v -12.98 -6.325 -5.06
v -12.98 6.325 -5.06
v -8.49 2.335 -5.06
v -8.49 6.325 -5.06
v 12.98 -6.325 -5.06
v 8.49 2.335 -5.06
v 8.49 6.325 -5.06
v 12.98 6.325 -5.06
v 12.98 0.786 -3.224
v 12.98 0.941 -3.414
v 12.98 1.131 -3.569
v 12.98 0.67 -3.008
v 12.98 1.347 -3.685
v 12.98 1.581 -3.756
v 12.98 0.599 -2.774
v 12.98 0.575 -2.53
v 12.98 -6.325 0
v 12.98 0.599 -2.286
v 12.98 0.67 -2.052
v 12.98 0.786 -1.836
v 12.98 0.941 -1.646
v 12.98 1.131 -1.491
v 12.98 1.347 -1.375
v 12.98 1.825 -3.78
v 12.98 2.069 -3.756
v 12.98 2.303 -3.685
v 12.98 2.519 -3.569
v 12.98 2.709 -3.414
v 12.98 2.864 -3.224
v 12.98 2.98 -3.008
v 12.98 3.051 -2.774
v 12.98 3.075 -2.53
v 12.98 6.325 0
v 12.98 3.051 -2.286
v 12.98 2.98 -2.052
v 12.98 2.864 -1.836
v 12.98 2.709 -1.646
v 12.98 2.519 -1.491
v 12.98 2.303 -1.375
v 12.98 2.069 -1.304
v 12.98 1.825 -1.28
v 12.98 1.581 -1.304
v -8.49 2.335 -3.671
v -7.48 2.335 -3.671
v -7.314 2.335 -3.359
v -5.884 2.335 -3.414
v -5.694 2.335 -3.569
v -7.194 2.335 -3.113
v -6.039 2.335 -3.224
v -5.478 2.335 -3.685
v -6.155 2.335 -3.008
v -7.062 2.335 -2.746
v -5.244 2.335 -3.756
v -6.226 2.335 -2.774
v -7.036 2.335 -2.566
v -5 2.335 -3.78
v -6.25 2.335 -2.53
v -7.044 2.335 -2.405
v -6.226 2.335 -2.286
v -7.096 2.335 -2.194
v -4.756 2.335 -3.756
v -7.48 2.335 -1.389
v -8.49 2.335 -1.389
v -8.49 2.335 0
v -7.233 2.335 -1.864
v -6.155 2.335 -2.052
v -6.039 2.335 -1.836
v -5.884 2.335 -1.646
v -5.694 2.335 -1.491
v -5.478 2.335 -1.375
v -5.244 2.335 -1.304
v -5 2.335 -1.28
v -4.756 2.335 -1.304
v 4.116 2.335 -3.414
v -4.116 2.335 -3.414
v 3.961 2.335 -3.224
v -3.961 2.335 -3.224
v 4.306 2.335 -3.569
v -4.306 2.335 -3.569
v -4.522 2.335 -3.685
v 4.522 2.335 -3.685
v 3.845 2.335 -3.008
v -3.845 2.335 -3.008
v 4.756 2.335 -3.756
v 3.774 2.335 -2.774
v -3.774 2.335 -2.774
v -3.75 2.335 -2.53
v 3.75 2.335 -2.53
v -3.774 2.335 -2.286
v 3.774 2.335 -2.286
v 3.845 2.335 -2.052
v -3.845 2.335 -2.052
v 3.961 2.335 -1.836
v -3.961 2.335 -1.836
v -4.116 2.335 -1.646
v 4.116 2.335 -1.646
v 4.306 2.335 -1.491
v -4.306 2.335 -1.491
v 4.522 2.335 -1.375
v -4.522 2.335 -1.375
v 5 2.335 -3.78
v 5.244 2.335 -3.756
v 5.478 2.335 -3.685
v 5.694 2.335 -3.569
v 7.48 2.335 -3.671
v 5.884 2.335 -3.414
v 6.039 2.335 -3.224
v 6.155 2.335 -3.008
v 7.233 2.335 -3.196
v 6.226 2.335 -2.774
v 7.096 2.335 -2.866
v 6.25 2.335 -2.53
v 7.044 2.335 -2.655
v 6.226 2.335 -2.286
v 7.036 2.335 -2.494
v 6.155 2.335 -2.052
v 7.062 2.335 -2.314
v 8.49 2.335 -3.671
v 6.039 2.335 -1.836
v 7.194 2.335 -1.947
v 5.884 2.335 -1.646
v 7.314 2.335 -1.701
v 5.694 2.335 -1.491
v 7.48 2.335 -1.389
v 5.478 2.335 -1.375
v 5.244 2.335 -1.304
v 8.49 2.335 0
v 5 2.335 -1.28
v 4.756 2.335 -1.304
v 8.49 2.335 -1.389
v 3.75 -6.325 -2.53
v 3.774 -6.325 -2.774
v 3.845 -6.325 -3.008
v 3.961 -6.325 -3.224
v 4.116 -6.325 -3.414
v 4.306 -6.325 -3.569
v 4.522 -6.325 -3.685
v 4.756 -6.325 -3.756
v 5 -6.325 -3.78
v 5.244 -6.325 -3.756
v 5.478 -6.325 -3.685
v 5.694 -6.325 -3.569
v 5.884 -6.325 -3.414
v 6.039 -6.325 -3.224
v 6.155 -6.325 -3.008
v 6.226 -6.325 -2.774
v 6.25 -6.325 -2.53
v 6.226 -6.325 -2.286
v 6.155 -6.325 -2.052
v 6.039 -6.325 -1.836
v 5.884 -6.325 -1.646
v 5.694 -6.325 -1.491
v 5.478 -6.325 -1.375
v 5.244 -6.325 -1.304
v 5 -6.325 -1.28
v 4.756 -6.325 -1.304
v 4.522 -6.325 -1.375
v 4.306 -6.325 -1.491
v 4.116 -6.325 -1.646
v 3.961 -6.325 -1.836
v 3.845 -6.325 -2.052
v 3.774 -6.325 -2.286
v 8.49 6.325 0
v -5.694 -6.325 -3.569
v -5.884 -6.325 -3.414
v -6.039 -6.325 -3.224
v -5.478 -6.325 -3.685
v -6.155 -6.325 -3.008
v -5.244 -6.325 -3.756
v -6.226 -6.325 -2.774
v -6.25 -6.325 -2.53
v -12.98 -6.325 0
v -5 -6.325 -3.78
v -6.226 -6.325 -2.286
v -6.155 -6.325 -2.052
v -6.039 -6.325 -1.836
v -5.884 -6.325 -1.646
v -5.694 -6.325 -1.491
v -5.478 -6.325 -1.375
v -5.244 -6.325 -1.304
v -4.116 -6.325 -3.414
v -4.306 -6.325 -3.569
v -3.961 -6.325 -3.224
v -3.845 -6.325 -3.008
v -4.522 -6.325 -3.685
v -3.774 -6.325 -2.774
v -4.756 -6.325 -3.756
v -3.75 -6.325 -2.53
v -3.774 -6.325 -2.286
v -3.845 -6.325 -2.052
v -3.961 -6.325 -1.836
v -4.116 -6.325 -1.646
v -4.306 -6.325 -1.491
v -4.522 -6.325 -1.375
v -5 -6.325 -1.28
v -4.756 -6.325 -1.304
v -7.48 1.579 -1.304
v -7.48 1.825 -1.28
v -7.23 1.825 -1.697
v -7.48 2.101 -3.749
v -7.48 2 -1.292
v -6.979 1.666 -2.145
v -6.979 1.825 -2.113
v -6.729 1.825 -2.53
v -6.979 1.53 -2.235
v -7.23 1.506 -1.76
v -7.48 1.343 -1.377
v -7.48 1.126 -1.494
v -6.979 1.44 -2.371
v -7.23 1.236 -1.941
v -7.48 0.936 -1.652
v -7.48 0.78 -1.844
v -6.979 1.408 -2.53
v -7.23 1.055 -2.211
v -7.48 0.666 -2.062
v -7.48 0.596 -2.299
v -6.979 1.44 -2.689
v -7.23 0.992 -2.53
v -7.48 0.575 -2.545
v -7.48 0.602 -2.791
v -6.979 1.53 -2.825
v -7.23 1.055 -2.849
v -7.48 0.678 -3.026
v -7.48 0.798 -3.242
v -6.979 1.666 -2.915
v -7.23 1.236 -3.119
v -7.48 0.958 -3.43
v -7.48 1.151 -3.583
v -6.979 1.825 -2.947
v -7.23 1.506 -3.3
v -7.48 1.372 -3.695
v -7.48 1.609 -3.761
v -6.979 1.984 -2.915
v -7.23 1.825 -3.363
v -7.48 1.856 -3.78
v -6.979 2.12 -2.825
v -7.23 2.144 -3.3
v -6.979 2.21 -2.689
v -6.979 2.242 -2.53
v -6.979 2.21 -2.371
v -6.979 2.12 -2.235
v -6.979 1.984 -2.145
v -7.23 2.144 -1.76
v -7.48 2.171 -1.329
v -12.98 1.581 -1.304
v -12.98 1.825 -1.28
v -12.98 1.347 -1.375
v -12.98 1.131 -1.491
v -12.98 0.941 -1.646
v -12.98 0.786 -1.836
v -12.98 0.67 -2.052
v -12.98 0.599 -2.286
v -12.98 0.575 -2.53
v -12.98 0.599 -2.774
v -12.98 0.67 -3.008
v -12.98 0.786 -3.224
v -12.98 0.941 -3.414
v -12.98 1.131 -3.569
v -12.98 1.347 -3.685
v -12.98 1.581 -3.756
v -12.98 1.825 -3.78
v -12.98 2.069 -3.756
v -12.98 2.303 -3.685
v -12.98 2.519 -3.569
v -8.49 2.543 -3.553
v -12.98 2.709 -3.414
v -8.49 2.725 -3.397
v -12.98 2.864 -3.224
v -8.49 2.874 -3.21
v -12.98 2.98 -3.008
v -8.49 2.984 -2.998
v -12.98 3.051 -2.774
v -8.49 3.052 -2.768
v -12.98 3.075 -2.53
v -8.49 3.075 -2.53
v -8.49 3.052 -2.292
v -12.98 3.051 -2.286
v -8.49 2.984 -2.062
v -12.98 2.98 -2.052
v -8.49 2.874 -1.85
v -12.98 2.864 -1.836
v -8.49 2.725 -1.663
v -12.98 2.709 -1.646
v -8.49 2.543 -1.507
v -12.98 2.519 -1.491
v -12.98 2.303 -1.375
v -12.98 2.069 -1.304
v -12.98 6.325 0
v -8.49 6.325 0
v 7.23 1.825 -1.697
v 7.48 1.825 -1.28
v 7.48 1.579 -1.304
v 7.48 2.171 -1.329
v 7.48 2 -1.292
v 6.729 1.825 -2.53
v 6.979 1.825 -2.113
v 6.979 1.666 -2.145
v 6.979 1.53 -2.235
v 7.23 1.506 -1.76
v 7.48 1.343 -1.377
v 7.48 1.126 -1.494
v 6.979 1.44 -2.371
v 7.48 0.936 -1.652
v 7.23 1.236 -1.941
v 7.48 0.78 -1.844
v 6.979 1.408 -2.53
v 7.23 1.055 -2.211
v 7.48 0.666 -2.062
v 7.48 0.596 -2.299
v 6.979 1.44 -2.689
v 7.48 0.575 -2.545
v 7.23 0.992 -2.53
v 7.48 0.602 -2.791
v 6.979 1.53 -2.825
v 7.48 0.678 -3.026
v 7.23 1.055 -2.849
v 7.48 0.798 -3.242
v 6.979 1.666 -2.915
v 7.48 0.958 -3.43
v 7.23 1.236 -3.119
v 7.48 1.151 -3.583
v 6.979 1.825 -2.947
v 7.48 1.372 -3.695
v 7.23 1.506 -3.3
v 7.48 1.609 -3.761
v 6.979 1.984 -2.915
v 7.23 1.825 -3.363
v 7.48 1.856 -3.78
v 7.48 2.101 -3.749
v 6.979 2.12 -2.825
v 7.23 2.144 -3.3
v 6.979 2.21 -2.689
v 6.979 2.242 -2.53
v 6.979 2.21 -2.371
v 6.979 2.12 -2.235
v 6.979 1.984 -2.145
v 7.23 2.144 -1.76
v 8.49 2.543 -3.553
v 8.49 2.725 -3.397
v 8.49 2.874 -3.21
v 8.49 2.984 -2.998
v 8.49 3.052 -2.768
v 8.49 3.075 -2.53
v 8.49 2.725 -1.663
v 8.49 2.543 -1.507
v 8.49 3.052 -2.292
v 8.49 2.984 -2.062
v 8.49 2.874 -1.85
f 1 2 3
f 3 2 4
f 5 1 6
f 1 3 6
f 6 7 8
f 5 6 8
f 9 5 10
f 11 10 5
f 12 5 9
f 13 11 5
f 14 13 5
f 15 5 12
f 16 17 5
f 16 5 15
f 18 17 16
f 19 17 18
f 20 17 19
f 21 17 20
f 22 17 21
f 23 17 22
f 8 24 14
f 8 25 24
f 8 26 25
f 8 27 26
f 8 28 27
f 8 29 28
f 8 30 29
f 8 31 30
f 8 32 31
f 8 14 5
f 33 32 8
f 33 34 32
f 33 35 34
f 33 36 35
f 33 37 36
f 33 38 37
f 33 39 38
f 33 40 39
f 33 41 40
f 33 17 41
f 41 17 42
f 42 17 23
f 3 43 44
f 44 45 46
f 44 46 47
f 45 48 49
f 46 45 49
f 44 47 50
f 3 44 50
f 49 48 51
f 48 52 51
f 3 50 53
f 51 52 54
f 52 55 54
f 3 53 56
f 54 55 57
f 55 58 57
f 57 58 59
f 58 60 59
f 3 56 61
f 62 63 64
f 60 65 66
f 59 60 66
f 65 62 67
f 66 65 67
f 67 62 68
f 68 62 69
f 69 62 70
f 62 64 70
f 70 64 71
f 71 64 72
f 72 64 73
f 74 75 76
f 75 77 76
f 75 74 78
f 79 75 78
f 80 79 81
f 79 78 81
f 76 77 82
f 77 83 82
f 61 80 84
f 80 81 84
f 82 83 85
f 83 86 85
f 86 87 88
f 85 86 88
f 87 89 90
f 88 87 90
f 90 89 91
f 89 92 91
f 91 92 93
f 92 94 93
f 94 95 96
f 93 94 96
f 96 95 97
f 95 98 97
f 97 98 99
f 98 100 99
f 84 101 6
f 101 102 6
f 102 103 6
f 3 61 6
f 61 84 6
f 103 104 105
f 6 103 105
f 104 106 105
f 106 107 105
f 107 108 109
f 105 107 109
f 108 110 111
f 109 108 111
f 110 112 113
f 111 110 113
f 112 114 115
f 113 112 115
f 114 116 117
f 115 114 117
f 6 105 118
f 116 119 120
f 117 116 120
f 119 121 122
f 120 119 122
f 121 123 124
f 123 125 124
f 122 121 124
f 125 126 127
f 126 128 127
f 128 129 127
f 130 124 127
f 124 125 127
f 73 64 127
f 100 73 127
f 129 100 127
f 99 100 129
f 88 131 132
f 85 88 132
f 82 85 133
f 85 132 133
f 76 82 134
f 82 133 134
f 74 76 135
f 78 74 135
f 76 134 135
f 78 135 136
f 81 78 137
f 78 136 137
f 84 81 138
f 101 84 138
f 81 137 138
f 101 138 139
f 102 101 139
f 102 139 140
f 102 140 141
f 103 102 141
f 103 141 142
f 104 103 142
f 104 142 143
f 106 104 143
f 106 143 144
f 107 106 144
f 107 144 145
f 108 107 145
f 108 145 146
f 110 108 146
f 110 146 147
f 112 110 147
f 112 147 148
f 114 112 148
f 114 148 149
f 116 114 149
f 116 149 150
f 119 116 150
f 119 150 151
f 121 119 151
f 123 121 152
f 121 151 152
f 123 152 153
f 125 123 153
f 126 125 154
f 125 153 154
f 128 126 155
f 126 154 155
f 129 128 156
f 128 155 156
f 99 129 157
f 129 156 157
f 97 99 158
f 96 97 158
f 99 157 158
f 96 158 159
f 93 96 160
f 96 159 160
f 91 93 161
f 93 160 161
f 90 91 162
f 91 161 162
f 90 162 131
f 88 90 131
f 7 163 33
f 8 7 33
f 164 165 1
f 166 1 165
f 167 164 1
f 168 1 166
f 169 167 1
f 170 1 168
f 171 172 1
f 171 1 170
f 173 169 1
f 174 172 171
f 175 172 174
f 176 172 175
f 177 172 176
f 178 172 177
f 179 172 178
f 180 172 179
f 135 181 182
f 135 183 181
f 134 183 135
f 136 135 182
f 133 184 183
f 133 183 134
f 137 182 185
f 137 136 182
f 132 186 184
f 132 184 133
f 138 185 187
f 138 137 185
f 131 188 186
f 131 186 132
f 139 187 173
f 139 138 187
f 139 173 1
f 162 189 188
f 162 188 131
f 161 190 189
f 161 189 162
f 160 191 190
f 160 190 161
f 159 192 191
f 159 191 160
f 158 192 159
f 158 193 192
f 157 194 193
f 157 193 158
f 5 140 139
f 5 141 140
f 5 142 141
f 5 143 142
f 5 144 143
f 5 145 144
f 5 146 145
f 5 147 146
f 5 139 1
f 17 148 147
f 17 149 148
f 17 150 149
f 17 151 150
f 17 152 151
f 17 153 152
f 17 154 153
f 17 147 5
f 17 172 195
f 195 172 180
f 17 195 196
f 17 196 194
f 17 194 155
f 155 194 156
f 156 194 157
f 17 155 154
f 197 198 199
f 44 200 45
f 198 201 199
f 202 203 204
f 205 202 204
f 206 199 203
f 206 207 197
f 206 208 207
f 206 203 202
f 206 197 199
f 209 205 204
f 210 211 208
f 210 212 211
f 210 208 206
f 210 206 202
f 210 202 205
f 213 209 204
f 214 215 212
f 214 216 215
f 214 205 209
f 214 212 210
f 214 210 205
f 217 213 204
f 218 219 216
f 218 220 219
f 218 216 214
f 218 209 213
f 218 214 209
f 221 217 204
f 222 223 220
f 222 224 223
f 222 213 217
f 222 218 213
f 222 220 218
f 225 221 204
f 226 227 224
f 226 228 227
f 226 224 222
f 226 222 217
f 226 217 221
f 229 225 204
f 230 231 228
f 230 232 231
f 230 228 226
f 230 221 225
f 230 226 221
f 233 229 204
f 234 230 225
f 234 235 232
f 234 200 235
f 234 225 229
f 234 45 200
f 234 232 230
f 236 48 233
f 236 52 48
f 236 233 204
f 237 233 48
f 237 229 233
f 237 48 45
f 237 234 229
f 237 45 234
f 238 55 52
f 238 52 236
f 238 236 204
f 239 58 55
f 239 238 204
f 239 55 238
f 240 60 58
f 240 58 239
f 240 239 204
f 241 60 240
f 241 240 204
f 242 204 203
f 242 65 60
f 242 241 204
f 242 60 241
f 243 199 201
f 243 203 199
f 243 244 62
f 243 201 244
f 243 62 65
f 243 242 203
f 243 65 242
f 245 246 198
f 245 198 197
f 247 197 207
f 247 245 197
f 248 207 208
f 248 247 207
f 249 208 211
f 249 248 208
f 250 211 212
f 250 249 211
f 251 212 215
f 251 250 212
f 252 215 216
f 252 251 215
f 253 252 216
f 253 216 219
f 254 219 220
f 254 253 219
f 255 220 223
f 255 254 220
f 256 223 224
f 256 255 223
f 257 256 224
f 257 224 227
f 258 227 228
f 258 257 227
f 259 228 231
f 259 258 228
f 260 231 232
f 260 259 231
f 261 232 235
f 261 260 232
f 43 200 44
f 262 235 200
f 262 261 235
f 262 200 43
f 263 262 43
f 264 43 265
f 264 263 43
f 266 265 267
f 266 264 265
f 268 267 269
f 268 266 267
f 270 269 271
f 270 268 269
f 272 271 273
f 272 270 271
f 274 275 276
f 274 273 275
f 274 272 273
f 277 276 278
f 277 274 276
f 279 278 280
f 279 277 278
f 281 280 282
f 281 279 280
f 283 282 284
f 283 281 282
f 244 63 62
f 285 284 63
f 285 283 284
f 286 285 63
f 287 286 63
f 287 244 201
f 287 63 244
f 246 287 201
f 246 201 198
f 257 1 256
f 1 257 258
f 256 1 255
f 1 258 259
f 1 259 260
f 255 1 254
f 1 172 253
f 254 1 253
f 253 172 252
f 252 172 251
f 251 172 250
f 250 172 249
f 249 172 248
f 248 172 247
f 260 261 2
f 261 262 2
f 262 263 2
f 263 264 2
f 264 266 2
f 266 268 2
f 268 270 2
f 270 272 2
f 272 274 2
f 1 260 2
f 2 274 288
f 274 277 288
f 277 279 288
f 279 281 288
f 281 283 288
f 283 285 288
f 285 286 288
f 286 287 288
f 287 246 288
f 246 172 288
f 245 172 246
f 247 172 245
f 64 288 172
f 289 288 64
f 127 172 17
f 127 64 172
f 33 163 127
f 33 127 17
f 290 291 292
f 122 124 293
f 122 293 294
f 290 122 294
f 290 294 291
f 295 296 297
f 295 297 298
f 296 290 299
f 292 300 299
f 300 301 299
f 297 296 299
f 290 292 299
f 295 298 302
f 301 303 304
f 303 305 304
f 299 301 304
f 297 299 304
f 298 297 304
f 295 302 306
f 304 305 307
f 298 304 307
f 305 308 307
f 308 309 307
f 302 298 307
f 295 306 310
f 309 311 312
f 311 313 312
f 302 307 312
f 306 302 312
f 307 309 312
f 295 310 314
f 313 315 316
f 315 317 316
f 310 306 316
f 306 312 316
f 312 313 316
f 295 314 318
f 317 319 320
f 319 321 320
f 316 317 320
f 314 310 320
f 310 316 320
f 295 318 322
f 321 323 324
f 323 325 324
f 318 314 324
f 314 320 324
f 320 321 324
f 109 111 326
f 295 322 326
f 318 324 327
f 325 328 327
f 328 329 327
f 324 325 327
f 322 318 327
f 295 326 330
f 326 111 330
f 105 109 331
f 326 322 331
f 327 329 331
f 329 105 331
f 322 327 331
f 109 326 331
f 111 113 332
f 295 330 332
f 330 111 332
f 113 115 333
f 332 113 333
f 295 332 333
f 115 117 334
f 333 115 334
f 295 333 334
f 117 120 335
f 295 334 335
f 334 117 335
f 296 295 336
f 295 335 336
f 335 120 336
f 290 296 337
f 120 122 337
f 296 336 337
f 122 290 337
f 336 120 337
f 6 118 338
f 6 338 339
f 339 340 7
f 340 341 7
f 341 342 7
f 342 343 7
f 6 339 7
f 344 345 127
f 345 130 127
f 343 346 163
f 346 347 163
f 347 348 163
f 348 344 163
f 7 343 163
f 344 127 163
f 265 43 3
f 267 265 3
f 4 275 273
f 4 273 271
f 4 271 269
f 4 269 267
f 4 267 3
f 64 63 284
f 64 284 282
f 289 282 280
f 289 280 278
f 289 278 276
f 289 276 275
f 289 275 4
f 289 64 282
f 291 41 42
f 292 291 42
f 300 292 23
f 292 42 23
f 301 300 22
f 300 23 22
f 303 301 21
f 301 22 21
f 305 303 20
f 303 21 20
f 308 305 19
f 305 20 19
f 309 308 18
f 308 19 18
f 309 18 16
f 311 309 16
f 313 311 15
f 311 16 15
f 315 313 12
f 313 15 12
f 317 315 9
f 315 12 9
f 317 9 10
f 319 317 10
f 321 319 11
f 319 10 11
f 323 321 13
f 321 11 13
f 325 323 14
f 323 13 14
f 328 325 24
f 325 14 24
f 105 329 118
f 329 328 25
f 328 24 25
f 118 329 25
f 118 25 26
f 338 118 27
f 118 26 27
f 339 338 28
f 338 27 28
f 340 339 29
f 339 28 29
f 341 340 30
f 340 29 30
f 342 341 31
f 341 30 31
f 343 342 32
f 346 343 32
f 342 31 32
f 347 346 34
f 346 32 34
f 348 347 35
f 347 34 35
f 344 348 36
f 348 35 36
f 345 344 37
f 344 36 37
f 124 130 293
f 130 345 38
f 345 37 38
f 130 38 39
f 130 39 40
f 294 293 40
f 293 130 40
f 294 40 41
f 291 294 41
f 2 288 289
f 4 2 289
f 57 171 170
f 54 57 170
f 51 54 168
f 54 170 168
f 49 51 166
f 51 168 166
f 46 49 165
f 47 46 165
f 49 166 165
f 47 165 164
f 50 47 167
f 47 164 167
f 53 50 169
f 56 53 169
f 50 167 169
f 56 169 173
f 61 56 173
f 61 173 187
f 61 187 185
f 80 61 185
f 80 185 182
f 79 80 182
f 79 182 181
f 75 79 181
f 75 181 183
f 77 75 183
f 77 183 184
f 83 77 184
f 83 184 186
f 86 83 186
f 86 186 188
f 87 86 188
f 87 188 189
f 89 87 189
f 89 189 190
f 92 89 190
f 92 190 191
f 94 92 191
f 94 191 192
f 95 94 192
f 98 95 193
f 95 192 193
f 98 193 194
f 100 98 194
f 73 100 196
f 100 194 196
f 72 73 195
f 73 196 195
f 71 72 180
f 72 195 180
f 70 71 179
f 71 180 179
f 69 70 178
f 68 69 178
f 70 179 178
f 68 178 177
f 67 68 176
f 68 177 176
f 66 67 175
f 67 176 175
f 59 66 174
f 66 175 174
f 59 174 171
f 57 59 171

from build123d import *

# Parameters (mm, degrees)
SCHIZZO1_W                   = 25.96
SCHIZZO1_H                   = 12.65
ESTRUSIONE_ESTRUSIONE1_DEPTH = 5.06
SCHIZZO2_W                   = 8.49
SCHIZZO2_H                   = 3.99
TAGLIO_ESTRUSIONE1_DEPTH     = 16.299987745
FORO_FILETTATO_M3X0_5_1_D    = 2.5


with BuildPart() as part:
    # Schizzo1 → Estrusione-Estrusione1 (new body)
    with BuildSketch(Plane.XY):
        Rectangle(SCHIZZO1_W, SCHIZZO1_H)
    extrude(amount=-ESTRUSIONE_ESTRUSIONE1_DEPTH)

    # Schizzo2 → Taglio-Estrusione1 (cut, through all)
    with BuildSketch(Plane.XY):
        with Locations((-4.245, 4.33)):
            Rectangle(SCHIZZO2_W, SCHIZZO2_H)
        with Locations((4.245, 4.33)):
            Rectangle(SCHIZZO2_W, SCHIZZO2_H)
    extrude(amount=-TAGLIO_ESTRUSIONE1_DEPTH, mode=Mode.SUBTRACT)

    # Foro filettato M3x0.5-1 (through all)
    with Locations(Plane(origin=(0, 2.335, 0), x_dir=(1, 0, 0), z_dir=(0, 1, 0))):
        with Locations((-5, 2.53), (5, 2.53)):
            Hole(FORO_FILETTATO_M3X0_5_1_D / 2)

    # Schizzo5 → Foro filettato M3x0.5-2 (revolve, cut)
    with BuildSketch(Plane(origin=(-12.98, 1.825, -2.53), x_dir=(0, 0, 1), z_dir=(0, 1, 0))):
        Polygon((0, 0), (0, 6.251075774), (1.25, 5.5), (1.25, 0), align=None)
    foro_filettato_m3x0_5_2 = revolve(axis=Axis((-19.33, 1.825, -2.53), (1, 0, 0)), mode=Mode.SUBTRACT)

    # Specchia1: Foro filettato M3x0.5-2 across plane
    add(foro_filettato_m3x0_5_2.mirror(Plane(origin=(0, 0, 0), x_dir=(0, 0, 1), z_dir=(1, 0, 0))), mode=Mode.SUBTRACT)


solid = part.part
